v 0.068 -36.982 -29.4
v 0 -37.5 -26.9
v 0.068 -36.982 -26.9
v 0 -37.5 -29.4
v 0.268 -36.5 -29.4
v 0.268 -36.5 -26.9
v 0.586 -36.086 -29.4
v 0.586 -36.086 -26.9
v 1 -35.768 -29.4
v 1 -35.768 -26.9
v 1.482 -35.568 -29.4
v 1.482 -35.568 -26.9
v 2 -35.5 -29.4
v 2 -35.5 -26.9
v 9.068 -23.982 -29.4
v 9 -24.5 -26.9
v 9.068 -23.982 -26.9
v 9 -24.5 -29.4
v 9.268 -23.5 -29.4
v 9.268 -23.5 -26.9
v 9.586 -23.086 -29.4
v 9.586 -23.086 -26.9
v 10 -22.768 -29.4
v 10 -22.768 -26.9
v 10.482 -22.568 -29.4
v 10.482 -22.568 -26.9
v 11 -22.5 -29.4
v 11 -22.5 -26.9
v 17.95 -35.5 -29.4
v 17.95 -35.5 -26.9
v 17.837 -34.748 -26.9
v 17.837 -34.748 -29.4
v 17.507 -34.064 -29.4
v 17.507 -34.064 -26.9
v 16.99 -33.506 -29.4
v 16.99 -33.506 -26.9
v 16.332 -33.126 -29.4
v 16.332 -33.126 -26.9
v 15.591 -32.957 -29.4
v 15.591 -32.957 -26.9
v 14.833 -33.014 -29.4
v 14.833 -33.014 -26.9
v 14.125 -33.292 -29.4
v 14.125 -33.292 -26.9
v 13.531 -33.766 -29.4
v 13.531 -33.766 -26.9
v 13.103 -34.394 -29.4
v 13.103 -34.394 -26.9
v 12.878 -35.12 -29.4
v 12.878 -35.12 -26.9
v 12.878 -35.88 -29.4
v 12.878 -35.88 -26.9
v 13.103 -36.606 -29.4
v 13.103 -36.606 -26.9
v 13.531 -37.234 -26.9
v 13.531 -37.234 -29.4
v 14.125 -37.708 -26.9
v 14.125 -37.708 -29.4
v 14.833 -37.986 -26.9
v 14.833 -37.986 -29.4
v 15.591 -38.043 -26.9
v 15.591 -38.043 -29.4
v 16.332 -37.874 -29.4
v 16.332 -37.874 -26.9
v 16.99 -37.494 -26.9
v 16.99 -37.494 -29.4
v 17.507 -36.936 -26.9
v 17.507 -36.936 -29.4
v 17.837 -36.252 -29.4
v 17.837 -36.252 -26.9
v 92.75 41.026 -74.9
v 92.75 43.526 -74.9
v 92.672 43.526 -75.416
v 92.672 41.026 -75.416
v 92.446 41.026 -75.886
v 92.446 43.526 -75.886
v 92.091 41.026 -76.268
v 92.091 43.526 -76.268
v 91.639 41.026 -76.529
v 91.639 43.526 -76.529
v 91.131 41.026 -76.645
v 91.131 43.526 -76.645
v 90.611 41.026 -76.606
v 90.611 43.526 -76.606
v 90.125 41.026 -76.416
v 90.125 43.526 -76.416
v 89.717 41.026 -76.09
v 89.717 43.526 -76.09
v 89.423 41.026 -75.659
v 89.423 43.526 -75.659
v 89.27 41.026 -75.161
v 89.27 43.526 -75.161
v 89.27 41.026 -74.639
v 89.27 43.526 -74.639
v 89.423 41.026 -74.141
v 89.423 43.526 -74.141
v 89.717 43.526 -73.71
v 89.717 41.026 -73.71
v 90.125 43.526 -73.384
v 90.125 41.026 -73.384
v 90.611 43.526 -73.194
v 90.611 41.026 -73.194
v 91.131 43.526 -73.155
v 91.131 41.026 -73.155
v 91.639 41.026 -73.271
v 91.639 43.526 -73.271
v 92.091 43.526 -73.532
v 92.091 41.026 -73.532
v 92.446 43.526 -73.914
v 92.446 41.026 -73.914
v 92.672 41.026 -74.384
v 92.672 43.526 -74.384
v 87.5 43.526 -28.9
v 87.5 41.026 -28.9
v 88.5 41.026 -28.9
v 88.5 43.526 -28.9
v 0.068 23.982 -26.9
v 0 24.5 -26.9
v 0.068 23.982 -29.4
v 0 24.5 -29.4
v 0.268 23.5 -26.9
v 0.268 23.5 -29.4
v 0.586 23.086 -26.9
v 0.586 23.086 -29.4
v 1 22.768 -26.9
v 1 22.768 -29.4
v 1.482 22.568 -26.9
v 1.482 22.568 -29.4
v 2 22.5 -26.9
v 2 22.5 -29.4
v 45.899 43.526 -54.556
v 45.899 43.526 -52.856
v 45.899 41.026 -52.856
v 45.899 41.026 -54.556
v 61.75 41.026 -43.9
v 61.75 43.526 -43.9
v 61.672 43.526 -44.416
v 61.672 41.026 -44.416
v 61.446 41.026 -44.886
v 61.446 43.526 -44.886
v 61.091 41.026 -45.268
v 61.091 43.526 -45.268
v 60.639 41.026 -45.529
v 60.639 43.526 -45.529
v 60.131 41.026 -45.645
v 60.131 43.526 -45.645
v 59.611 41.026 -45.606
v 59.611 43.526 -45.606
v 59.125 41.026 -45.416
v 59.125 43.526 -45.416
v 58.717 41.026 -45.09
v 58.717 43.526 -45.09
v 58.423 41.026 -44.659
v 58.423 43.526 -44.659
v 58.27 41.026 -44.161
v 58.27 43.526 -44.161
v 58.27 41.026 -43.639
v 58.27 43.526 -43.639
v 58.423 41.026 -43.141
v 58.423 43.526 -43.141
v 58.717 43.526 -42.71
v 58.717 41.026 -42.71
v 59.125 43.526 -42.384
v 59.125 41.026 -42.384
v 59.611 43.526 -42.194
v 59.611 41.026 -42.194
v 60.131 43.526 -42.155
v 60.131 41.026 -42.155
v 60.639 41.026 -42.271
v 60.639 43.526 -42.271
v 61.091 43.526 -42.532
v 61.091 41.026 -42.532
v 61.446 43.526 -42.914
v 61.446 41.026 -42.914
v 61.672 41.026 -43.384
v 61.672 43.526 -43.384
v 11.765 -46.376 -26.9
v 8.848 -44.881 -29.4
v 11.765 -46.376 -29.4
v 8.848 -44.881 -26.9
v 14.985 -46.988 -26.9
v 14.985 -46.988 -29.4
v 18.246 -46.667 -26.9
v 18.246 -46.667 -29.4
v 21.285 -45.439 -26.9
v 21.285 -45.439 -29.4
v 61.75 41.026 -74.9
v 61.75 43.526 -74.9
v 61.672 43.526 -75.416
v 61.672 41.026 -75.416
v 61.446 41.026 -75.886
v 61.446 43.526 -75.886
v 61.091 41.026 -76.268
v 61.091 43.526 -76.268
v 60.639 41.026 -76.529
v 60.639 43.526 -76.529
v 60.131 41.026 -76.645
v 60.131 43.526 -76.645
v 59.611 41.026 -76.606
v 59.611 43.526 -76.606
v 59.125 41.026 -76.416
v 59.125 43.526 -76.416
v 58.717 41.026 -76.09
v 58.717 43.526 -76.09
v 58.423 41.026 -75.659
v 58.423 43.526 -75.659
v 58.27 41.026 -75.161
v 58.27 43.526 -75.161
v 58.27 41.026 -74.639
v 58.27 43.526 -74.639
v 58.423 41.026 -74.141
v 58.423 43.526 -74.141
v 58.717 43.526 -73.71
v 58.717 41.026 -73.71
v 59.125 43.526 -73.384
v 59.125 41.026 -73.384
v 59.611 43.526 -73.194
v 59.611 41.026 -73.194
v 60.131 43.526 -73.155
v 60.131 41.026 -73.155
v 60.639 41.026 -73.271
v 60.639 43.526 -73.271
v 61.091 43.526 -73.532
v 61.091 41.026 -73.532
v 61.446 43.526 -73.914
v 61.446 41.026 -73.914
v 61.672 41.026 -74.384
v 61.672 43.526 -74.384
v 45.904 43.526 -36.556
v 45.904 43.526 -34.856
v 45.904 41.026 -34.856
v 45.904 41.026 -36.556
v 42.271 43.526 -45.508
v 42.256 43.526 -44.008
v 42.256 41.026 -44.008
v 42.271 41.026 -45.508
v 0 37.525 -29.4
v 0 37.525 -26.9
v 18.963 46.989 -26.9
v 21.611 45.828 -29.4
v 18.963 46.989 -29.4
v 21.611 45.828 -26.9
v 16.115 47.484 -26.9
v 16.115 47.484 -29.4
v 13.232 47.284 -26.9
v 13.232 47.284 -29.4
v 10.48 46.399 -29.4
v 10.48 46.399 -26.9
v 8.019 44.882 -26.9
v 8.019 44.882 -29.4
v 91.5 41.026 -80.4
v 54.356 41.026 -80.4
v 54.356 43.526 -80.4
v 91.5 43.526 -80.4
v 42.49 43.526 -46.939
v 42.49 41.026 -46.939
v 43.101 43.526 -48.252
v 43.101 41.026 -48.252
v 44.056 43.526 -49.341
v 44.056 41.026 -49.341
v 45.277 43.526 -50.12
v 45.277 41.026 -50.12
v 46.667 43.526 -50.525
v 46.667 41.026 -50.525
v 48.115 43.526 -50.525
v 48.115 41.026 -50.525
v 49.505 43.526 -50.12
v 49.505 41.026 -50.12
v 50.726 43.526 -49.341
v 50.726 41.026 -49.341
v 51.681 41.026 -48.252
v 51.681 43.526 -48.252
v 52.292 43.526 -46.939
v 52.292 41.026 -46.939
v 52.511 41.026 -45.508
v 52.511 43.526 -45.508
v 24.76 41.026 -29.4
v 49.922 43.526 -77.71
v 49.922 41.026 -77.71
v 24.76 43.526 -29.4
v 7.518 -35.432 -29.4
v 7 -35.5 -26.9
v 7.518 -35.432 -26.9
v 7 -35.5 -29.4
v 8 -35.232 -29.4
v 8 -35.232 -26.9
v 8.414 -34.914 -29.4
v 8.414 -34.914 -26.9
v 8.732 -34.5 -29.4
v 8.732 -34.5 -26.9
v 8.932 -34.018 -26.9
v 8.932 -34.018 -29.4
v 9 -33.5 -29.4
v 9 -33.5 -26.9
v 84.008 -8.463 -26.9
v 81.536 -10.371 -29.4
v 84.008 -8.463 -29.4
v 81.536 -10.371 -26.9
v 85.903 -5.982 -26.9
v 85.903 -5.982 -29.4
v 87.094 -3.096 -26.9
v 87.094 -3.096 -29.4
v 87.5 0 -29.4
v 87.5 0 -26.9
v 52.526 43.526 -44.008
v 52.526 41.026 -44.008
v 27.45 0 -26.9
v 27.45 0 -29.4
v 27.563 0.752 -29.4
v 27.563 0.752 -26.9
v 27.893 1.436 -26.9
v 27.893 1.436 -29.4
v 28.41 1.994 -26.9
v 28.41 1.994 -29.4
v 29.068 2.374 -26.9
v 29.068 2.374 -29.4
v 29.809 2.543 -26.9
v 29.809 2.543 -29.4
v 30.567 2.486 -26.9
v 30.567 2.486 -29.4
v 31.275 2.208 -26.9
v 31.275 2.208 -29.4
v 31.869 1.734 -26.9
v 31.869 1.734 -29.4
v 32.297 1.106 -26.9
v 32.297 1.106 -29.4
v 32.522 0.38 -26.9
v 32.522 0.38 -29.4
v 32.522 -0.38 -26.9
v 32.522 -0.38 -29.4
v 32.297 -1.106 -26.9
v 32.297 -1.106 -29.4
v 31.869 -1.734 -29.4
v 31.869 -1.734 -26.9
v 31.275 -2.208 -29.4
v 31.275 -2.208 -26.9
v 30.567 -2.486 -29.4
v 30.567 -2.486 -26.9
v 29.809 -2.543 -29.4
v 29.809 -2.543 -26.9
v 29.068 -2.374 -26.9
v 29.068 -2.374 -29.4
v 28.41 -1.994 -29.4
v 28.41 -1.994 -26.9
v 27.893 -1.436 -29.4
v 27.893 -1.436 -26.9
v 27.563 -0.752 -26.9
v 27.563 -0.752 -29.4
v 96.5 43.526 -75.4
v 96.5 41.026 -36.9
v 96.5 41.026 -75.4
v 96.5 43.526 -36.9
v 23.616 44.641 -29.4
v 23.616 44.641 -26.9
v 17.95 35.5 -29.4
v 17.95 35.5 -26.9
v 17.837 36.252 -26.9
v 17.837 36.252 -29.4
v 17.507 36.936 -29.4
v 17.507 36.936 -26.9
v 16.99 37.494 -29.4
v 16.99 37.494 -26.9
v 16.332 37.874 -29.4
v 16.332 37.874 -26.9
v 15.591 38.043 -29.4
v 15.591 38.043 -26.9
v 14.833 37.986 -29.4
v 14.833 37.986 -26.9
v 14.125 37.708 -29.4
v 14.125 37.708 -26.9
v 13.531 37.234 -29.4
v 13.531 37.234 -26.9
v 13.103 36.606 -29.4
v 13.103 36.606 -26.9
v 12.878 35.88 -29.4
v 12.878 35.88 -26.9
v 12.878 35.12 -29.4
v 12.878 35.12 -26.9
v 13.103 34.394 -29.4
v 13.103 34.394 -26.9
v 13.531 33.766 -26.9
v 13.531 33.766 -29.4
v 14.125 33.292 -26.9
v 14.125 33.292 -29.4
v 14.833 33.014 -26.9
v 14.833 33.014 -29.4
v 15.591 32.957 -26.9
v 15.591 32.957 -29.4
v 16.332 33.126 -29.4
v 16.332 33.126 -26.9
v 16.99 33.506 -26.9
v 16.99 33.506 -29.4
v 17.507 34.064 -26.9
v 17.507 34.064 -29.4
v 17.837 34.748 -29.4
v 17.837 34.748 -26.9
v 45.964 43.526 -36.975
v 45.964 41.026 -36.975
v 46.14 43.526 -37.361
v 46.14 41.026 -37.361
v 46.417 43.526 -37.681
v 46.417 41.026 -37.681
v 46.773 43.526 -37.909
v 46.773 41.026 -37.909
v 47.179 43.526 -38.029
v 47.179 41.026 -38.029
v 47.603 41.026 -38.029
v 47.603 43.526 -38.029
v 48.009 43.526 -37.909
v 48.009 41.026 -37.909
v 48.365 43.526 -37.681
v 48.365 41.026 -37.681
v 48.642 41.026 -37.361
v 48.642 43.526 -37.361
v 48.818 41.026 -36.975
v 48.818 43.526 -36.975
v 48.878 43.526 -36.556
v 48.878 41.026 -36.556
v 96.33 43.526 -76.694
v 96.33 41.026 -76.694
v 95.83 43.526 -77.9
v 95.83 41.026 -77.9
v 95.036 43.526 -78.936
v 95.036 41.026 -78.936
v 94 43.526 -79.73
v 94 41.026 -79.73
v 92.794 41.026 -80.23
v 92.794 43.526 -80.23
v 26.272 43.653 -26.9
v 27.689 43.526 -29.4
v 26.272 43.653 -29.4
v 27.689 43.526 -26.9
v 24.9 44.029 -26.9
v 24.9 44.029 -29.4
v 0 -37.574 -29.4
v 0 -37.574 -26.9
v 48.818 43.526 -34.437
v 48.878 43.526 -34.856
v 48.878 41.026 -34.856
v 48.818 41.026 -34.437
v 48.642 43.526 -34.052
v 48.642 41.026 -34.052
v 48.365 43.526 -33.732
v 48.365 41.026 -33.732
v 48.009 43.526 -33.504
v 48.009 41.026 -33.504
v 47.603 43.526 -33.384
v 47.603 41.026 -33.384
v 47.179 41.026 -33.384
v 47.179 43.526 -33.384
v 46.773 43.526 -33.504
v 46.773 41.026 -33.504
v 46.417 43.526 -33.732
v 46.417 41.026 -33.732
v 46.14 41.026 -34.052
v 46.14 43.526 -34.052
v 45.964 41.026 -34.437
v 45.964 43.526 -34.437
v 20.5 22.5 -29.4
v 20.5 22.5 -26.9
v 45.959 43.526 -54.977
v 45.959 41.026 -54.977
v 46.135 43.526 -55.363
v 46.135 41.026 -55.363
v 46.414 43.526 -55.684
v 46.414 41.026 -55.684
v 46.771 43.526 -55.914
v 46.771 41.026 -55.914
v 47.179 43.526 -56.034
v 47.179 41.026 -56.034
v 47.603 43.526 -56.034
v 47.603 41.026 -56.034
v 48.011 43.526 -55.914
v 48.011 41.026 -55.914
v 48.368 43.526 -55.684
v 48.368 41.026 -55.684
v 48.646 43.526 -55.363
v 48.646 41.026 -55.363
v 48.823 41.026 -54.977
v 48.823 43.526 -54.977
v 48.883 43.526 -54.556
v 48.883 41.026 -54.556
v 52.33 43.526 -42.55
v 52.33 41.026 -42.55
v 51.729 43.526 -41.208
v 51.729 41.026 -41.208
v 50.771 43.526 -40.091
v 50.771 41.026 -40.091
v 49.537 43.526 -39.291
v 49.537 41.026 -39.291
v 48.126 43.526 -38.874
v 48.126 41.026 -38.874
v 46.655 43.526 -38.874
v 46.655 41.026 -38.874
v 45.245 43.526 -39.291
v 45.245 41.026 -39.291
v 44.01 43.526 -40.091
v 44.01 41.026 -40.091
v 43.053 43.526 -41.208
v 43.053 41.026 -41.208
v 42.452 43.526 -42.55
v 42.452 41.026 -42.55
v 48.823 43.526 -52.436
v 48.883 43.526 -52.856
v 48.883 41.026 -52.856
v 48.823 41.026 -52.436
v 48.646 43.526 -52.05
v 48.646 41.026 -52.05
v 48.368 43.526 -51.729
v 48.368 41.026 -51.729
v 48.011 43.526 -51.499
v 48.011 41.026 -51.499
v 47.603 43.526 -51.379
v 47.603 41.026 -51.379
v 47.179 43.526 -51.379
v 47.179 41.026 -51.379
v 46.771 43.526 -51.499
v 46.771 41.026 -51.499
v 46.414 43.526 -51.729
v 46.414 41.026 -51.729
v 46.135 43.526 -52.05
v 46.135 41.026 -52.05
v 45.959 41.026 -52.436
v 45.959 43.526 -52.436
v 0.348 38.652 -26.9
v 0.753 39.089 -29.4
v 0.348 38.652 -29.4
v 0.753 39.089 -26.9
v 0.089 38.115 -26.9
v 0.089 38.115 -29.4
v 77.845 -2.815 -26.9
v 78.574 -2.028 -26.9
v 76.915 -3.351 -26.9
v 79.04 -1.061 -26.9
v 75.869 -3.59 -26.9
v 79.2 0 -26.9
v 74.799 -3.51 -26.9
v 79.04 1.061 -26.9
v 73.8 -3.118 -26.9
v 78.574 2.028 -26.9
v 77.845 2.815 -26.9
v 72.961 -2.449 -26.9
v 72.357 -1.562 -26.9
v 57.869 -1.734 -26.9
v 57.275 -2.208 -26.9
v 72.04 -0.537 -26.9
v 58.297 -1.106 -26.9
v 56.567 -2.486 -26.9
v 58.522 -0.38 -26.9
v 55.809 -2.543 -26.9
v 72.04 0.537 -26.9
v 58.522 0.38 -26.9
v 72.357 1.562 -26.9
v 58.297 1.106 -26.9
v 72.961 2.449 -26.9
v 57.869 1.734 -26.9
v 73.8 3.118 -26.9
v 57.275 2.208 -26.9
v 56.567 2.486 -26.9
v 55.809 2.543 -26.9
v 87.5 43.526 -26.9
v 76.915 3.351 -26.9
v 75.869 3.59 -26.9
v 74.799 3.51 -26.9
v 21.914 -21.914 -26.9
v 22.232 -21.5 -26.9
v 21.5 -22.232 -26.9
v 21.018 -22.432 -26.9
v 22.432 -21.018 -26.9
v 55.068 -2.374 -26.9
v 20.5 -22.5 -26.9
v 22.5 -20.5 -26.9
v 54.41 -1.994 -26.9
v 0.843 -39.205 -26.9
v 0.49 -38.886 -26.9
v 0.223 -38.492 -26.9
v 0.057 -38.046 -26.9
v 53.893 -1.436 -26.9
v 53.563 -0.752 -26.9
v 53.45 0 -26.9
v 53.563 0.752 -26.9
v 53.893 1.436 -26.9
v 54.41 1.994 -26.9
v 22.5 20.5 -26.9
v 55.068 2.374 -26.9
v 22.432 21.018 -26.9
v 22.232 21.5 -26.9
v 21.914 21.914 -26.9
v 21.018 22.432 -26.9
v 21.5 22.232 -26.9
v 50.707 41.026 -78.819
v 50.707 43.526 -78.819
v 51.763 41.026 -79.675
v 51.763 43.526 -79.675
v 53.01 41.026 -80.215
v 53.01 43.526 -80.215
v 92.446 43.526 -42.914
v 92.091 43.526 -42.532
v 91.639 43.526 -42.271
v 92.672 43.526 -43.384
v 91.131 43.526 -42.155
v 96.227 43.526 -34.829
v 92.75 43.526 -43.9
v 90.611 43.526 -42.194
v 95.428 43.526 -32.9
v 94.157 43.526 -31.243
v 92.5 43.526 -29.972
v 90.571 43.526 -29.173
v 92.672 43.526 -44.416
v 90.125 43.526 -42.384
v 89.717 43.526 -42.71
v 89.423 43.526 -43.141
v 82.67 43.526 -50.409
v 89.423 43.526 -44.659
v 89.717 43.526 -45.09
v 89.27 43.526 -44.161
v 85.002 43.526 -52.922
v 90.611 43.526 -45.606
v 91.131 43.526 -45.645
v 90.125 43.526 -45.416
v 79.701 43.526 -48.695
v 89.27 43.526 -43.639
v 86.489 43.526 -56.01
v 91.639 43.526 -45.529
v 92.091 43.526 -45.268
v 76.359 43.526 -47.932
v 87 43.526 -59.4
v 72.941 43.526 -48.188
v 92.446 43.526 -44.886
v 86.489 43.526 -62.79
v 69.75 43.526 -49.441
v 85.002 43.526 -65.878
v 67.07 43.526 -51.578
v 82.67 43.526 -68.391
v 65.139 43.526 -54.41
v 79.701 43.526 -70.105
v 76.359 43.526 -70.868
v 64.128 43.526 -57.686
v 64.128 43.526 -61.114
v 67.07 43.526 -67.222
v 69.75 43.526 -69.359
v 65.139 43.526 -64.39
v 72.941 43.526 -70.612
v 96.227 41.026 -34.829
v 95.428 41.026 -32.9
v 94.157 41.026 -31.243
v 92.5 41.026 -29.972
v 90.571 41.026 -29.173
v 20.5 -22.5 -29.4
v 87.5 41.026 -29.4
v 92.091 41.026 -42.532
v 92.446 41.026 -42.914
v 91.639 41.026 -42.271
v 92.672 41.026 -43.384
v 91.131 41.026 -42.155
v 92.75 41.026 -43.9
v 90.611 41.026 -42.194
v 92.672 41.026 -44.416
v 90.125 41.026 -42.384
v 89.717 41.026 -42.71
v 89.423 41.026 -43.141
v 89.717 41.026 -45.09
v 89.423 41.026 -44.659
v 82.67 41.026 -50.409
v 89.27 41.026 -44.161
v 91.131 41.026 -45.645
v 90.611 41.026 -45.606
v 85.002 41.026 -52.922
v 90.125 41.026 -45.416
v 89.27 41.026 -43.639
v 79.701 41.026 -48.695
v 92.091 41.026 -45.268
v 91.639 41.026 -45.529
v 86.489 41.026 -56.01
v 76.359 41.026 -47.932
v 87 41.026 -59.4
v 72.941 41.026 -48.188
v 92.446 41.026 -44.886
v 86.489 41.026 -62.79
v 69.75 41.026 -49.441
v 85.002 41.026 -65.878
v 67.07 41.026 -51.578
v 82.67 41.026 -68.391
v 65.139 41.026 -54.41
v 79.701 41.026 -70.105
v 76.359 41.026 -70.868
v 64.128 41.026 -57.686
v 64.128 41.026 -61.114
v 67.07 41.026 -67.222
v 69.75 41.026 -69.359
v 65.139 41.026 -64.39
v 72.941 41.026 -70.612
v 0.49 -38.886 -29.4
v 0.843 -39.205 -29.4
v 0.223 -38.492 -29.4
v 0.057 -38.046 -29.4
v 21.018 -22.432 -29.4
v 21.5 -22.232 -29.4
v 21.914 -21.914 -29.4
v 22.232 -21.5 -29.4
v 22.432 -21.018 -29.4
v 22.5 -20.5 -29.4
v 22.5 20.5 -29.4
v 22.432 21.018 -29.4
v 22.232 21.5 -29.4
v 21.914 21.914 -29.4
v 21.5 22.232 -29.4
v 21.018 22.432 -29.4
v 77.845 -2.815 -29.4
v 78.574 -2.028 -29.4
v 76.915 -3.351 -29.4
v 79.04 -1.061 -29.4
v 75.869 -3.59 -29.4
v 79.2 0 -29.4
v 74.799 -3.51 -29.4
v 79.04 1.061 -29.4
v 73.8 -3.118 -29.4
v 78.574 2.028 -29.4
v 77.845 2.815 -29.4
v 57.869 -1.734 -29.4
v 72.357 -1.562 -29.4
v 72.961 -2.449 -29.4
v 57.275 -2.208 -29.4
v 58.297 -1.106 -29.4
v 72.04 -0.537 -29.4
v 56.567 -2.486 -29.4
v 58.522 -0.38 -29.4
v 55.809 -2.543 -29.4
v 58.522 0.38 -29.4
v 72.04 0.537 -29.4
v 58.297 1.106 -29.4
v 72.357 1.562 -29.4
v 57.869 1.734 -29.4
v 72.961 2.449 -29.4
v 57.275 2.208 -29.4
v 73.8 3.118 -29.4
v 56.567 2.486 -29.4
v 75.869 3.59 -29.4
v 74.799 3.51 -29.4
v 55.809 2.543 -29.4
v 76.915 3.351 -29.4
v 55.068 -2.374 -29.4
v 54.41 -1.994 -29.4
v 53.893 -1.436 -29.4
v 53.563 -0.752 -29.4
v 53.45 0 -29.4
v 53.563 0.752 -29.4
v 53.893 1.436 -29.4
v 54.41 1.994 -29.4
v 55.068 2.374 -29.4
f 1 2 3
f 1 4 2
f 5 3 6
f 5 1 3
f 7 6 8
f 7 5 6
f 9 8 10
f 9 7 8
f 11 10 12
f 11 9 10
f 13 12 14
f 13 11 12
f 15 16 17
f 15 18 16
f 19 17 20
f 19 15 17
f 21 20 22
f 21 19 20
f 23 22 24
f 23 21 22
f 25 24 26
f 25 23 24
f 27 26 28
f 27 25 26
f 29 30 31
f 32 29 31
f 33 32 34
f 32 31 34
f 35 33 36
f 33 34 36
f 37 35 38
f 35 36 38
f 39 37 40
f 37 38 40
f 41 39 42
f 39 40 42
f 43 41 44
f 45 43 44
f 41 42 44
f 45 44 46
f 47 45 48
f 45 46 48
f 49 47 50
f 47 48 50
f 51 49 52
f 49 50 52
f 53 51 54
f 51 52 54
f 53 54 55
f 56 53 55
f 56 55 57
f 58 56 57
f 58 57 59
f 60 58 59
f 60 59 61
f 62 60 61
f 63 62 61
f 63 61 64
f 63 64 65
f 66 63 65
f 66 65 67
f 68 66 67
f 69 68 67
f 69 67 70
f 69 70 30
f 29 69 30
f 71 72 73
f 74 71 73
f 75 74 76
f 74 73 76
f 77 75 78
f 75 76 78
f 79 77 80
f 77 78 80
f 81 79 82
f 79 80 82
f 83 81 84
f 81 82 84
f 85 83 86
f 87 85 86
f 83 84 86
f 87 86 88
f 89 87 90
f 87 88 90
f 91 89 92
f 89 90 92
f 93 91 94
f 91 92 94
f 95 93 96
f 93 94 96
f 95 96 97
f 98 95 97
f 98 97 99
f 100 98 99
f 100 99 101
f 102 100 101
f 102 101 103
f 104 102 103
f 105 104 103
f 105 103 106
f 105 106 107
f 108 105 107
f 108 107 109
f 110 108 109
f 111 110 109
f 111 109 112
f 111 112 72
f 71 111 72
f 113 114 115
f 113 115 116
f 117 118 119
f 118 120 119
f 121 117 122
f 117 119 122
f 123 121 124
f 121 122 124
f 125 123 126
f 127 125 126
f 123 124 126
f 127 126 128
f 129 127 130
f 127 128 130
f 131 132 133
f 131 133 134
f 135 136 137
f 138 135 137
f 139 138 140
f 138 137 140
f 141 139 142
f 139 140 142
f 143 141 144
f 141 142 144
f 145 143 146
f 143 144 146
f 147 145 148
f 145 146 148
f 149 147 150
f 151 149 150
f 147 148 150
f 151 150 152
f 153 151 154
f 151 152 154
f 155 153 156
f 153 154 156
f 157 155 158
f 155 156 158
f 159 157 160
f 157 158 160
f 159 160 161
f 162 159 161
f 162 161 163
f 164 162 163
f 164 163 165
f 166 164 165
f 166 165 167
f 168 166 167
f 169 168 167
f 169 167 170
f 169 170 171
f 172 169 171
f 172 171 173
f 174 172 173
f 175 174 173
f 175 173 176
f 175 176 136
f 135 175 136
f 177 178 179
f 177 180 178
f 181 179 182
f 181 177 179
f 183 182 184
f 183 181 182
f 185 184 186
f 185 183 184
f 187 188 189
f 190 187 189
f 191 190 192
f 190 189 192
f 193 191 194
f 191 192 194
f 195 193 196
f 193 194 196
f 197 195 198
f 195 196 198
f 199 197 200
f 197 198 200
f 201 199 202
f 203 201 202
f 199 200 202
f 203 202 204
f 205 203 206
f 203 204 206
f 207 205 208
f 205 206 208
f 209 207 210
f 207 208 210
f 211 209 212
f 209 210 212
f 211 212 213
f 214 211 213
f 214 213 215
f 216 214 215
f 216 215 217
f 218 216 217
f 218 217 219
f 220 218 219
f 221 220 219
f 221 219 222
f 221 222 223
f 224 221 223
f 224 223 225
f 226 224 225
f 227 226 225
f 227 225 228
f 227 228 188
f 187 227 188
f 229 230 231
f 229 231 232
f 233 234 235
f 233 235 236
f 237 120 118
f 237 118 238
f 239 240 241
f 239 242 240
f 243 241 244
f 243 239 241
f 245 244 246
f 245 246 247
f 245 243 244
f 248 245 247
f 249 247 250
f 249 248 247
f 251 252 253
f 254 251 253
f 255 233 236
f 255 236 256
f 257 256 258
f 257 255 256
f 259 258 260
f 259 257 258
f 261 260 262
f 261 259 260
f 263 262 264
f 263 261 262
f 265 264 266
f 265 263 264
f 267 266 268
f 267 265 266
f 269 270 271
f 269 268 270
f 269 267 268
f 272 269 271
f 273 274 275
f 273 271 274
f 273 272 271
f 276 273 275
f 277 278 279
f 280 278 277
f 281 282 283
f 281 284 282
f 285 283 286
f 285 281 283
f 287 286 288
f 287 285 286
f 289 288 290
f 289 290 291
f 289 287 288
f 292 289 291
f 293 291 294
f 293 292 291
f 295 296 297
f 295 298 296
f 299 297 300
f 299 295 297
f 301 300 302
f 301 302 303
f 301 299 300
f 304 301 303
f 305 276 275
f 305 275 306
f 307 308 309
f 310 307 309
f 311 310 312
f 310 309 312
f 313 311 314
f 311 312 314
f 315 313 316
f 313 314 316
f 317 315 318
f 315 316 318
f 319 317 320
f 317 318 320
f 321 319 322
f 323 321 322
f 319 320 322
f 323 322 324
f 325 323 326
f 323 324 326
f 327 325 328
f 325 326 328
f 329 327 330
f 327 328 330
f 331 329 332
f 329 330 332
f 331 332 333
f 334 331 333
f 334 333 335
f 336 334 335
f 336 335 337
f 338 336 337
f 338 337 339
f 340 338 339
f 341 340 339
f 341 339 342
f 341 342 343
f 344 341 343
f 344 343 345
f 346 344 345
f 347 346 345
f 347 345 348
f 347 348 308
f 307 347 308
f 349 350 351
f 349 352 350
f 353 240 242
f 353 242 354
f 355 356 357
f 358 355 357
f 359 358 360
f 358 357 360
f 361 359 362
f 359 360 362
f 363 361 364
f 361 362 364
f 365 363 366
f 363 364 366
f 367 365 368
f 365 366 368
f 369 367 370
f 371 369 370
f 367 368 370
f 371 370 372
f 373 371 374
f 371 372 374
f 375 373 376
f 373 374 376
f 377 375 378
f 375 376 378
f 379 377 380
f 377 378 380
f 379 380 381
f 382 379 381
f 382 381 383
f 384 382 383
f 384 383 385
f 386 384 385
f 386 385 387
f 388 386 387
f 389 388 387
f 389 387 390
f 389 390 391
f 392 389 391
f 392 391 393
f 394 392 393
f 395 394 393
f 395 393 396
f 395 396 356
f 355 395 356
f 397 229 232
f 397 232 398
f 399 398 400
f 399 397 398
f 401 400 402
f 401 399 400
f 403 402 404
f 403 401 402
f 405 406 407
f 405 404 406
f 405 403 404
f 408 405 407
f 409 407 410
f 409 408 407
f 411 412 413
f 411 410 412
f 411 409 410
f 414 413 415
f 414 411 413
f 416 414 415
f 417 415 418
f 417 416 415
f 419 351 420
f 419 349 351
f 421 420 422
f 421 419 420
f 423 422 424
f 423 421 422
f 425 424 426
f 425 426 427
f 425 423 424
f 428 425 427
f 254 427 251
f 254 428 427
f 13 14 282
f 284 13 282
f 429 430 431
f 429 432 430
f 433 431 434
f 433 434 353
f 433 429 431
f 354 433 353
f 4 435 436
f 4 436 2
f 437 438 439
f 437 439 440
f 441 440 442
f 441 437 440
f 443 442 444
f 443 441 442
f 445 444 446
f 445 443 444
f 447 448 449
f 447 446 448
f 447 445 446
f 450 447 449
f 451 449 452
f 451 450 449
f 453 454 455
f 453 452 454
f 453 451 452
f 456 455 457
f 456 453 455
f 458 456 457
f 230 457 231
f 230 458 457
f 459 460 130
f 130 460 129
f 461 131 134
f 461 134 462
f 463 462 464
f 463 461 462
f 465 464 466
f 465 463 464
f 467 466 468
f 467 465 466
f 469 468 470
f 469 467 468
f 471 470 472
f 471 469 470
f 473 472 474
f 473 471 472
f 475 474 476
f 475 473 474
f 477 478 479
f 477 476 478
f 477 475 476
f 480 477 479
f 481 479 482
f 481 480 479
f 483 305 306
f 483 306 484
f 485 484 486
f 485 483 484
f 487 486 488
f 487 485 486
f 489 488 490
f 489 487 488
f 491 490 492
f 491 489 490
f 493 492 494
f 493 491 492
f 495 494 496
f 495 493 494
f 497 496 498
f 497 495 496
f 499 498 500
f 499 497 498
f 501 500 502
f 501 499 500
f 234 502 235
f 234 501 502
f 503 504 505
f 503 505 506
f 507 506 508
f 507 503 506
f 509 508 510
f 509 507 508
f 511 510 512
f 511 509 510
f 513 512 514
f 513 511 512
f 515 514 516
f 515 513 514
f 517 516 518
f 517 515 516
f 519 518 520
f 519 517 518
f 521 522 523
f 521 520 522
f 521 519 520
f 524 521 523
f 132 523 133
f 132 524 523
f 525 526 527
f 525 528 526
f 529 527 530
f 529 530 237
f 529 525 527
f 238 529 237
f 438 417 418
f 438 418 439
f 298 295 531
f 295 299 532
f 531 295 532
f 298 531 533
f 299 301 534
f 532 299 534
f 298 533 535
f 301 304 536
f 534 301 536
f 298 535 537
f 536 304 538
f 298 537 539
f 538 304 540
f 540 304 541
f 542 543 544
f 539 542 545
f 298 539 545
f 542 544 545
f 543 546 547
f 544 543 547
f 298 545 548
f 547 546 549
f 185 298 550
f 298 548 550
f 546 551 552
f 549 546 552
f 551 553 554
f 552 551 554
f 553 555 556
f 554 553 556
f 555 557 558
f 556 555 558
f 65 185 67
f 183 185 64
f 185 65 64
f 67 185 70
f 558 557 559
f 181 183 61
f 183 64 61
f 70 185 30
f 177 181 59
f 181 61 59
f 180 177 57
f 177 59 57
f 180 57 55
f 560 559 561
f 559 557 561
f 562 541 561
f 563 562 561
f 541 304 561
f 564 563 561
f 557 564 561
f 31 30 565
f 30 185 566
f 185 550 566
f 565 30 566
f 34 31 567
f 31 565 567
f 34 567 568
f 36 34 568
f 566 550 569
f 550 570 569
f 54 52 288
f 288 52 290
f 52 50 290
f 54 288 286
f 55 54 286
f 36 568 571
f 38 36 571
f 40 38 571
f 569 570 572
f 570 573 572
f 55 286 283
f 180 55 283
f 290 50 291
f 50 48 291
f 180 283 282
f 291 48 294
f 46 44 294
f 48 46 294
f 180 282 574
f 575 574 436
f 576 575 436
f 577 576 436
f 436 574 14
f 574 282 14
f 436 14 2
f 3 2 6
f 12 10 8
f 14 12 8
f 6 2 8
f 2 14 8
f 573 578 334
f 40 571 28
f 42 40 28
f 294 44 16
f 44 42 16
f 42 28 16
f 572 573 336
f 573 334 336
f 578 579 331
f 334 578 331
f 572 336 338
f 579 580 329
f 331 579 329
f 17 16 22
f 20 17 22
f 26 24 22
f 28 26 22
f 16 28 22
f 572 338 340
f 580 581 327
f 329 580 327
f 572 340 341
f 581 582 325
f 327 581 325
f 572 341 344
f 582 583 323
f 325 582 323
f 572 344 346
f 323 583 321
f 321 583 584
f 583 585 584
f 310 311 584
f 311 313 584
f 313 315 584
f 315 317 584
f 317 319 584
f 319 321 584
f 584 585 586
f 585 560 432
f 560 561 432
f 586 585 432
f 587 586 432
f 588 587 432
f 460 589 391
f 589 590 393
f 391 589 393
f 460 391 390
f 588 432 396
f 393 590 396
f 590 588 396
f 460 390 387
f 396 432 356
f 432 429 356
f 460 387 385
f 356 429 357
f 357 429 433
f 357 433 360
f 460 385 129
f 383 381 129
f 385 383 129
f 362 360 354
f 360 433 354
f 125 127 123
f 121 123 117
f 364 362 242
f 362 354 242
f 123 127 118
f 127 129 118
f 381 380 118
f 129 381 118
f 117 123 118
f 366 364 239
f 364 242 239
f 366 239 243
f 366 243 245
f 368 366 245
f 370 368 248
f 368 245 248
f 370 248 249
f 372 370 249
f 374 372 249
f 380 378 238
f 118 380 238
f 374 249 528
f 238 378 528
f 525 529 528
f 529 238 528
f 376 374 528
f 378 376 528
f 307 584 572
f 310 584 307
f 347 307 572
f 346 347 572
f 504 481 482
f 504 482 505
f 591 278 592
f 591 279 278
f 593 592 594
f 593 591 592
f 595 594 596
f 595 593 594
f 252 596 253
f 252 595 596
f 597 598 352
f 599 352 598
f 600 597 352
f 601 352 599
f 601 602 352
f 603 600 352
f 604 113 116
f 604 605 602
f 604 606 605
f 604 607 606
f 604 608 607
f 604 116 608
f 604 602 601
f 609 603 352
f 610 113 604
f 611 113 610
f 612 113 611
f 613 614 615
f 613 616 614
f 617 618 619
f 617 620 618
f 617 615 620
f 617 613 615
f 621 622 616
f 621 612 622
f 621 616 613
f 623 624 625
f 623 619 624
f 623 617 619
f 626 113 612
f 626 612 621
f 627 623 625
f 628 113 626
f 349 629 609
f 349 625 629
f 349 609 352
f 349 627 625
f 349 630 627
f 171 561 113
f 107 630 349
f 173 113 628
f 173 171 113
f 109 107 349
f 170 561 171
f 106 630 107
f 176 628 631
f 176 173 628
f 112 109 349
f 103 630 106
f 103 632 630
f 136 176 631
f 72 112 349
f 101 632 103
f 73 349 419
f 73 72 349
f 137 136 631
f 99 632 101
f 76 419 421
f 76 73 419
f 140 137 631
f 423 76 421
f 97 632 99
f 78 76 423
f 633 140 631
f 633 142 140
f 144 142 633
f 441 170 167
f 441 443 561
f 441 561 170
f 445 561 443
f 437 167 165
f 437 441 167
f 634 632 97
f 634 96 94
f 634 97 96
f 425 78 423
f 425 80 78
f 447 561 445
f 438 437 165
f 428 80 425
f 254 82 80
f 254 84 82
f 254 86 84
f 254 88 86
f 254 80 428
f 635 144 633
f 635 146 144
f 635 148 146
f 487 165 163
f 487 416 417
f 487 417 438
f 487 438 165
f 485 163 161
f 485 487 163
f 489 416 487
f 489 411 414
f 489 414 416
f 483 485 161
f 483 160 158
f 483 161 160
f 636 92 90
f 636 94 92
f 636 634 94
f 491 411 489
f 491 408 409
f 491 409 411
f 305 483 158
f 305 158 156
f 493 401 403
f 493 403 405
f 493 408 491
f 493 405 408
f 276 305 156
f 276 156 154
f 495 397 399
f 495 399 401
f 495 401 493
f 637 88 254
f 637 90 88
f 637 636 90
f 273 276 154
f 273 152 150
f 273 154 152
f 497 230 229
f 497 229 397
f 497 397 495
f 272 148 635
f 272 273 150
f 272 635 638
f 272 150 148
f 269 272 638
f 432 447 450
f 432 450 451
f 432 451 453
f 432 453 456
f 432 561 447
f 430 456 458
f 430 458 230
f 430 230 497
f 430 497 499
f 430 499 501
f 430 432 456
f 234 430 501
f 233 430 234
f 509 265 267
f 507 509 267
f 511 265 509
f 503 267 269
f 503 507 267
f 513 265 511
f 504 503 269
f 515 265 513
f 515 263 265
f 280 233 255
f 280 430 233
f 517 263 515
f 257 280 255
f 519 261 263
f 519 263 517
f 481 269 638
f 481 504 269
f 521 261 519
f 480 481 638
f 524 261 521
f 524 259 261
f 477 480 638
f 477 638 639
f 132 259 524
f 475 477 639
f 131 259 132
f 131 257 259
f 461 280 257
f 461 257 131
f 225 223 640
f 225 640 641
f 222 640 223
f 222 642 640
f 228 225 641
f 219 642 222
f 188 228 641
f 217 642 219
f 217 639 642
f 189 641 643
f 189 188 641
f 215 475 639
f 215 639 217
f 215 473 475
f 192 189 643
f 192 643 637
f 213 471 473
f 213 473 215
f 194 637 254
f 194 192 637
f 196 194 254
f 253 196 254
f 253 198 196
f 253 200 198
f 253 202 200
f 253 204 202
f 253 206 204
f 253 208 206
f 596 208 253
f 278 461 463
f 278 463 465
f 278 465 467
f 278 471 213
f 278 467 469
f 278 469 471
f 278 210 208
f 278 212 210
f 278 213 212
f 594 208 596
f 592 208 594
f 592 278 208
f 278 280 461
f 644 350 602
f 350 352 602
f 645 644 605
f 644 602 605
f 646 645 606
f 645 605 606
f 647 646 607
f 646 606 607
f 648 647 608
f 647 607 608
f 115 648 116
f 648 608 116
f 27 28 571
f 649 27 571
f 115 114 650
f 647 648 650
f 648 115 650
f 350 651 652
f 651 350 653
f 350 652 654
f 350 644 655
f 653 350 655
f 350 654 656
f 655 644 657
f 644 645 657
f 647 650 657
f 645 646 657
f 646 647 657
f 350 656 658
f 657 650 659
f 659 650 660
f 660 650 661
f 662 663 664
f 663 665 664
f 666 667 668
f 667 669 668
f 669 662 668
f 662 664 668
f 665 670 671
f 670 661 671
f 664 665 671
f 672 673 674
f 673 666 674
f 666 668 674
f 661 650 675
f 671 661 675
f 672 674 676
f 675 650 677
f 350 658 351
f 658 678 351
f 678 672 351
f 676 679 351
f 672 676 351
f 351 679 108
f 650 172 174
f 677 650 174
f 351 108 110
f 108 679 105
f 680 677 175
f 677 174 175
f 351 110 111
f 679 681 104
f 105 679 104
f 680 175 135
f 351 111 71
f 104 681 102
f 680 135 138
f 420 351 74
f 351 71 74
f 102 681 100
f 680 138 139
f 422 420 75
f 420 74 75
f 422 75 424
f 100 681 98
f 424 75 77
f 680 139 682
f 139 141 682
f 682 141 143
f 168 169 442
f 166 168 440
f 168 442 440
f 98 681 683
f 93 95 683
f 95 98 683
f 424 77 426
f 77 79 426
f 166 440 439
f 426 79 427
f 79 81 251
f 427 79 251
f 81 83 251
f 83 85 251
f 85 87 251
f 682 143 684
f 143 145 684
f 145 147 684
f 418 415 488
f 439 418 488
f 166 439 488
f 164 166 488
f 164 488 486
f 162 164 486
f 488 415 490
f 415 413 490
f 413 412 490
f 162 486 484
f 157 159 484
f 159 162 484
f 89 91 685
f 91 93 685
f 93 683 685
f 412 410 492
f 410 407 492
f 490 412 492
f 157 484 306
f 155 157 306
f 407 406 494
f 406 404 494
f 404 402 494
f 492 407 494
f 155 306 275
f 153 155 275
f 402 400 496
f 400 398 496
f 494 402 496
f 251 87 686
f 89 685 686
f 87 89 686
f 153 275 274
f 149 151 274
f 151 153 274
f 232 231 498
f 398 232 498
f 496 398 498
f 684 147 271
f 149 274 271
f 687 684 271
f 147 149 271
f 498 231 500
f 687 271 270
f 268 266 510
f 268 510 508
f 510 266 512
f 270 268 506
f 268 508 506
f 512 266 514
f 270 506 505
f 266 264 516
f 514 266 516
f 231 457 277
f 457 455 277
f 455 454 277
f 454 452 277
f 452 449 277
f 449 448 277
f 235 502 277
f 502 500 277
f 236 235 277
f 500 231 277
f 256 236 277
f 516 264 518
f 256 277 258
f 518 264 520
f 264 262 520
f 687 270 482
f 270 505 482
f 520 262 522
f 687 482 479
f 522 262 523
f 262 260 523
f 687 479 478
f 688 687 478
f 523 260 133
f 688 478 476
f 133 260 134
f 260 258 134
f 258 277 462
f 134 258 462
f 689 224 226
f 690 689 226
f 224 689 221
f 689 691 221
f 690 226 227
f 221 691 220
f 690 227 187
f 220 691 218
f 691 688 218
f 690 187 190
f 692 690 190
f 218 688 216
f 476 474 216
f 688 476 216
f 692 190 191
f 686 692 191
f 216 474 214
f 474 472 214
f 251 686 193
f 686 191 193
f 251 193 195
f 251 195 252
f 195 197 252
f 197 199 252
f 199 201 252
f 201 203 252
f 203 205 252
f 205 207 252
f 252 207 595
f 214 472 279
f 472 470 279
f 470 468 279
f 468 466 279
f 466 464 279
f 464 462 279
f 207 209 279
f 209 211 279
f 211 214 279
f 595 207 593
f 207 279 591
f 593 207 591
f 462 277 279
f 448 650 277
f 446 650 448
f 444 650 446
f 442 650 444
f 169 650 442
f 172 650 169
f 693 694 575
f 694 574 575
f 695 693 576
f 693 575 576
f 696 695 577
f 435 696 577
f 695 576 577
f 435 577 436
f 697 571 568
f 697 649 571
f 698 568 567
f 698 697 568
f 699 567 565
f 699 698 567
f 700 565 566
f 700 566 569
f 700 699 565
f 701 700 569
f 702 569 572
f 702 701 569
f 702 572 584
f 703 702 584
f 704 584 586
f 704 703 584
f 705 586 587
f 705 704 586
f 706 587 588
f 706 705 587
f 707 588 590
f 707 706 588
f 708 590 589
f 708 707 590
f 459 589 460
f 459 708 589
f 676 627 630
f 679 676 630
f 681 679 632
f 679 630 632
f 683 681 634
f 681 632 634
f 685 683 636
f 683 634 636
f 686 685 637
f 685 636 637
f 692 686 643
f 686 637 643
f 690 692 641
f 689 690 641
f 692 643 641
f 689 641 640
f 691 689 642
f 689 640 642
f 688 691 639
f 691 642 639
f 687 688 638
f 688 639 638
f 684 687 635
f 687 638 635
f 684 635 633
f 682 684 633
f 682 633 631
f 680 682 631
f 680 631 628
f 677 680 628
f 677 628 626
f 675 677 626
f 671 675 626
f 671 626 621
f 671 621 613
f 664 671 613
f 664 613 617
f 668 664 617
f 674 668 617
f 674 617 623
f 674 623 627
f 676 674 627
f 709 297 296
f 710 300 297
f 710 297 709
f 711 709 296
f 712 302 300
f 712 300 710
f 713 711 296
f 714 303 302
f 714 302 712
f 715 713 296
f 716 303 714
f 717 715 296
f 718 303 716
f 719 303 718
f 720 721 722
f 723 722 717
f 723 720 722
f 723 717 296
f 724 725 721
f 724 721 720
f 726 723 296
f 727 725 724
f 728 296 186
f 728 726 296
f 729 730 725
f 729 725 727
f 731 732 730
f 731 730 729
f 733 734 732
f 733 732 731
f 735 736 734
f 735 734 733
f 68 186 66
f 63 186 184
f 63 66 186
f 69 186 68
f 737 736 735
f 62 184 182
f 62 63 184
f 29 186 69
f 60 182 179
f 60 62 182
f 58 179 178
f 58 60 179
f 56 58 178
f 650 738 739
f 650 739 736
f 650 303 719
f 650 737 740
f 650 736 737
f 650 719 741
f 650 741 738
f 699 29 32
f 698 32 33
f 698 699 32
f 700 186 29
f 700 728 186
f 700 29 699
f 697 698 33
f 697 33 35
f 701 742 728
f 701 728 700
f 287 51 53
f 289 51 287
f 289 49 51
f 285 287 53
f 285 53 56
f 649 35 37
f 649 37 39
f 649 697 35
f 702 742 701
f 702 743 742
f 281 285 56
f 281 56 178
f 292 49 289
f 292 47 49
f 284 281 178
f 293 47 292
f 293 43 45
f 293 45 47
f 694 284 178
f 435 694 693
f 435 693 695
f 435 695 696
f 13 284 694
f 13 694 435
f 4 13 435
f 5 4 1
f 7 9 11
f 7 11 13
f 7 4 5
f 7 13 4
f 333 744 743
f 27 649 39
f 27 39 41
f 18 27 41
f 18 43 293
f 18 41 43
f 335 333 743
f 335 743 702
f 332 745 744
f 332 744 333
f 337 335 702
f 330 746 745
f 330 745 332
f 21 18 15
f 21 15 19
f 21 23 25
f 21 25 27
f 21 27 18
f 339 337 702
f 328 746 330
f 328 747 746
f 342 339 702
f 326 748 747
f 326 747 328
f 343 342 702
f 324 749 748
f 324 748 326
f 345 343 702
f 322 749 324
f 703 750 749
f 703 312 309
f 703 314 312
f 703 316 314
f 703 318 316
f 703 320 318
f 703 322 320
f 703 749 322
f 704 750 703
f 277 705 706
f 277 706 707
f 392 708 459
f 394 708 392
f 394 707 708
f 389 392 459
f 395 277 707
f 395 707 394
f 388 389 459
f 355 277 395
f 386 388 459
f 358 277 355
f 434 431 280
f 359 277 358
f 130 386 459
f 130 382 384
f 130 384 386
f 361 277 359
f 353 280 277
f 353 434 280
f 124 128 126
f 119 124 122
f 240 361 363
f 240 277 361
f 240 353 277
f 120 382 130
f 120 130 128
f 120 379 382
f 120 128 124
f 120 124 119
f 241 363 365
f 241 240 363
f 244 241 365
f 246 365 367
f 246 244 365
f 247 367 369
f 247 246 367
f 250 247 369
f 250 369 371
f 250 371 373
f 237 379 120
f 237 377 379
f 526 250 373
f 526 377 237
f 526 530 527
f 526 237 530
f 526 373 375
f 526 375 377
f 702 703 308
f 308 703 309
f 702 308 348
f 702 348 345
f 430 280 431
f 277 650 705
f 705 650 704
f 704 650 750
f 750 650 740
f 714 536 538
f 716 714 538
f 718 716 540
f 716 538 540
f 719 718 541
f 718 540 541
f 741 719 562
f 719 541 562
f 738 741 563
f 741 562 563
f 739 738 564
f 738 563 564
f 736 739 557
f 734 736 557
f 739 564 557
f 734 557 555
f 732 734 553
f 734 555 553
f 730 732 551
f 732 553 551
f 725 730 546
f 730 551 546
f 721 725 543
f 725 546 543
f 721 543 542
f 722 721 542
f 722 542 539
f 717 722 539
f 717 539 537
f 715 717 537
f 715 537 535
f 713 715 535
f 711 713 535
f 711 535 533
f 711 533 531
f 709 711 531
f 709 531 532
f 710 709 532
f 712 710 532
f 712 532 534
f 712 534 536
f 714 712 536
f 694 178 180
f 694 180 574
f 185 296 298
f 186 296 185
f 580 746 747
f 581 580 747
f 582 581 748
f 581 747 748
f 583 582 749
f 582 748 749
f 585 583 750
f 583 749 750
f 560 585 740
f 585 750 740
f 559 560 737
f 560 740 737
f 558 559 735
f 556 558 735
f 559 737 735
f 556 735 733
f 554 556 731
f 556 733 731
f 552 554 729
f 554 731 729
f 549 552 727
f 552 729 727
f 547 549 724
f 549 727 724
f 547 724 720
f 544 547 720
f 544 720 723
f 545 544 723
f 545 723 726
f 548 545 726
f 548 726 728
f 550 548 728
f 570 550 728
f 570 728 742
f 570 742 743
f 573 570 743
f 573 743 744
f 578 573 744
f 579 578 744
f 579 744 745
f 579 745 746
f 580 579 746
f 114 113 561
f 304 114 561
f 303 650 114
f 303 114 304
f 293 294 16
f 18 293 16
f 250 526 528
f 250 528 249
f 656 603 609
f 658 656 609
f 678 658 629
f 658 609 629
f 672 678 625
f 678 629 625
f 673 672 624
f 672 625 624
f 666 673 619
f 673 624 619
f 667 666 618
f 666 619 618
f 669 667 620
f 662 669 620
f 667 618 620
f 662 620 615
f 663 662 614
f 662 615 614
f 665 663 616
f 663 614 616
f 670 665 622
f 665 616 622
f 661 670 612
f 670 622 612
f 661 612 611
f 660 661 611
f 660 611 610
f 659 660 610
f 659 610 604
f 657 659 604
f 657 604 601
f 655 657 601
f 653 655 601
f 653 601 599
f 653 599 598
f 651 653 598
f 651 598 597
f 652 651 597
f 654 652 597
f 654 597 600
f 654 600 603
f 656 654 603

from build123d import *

# Parameters (mm, degrees)
SALIENTE_EXTRUIR1_DEPTH             = 2.5
CROQUIS2_W                          = 51
CROQUIS2_H                          = 2.5
SALIENTE_EXTRUIR2_DEPTH             = 36.177083333
SALIENTE_EXTRUIR3_DEPTH             = 2.5
CROQUIS4_W                          = 51.5
CROQUIS4_H                          = 2.5
SALIENTE_EXTRUIR4_DEPTH             = 9
CORTAR_EXTRUIR1_DEPTH               = 122.155458756
DI_METRO_DE_TALADRO_5_1_5_1_1_D     = 5.1
DI_METRO_DE_TALADRO_5_1_5_1_1_DEPTH = 53.5
DI_METRO_DE_TALADRO_5_1_5_1_2_D     = 5.1
DI_METRO_DE_TALADRO_7_2_7_2_1_D     = 7.2
DI_METRO_DE_TALADRO_23_0_23_1_D     = 23
DI_METRO_DE_TALADRO_23_0_23_1_DEPTH = 9.015002711
DI_METRO_DE_TALADRO_3_5_3_5_1_D     = 3.5
DI_METRO_DE_TALADRO_3_5_3_5_1_DEPTH = 9.015002711
REDONDEO1_R                         = 2
REDONDEO2_R                         = 5
REDONDEO3_R                         = 8
REDONDEO4_R                         = 11.5
REDONDEO5_R                         = 12
CORTAR_EXTRUIR2_DEPTH               = 10


with BuildPart() as part:
    # Croquis1 → Saliente-Extruir1 (new body)
    with BuildSketch(Plane(origin=(0, 43.526431985, 0), x_dir=(1, 0, 0), z_dir=(0, 1, 0))):
        Polygon((24.760416667, 29.4), (51.322916667, 29.4), (51.322916667, 80.4), align=None)
    extrude(amount=-SALIENTE_EXTRUIR1_DEPTH)

    # Croquis2 → Saliente-Extruir2 (add)
    with BuildSketch(Plane(origin=(51.322916667, 0, 0), x_dir=(0, 0, -1), z_dir=(1, 0, 0))):
        with Locations((54.9, 42.276431985)):
            Rectangle(CROQUIS2_W, CROQUIS2_H)
    extrude(amount=SALIENTE_EXTRUIR2_DEPTH)

    # Croquis3 → Saliente-Extruir3 (add)
    with BuildSketch(Plane.XY.offset(-29.4)):
        Polygon((0, -38.607215424), (0, 38.4885797), (14.488727812, 50.041434696), (25.5, 43.526431985), (87.5, 43.526431985), (87.5, -6.900242064), (14.886977722, -49.162809247), align=None)
    extrude(amount=SALIENTE_EXTRUIR3_DEPTH)

    # Croquis4 → Saliente-Extruir4 (add)
    with BuildSketch(Plane(origin=(87.5, 0, 0), x_dir=(0, 0, -1), z_dir=(1, 0, 0))):
        with Locations((54.65, 42.276431985)):
            Rectangle(CROQUIS4_W, CROQUIS4_H)
    extrude(amount=SALIENTE_EXTRUIR4_DEPTH)

    # Croquis5 → Cortar-Extruir1 (cut, through all)
    with BuildSketch(Plane.XY.offset(-26.9)):
        Polygon((0, 22.5), (0, -35.5), (9, -35.5), (9, -22.5), (22.5, -22.5), (22.5, 22.5), align=None)
    extrude(amount=-CORTAR_EXTRUIR1_DEPTH, mode=Mode.SUBTRACT)

    # Diámetro de taladro Ø5.1 (5.1)1
    with Locations(Plane.XY.offset(-26.9)):
        with Locations((56, 0), (30, 0)):
            Hole(DI_METRO_DE_TALADRO_5_1_5_1_1_D / 2, depth=DI_METRO_DE_TALADRO_5_1_5_1_1_DEPTH)

    # Diámetro de taladro Ø5.1 (5.1)2 (through all)
    with Locations(Plane(origin=(0, 0, -29.4), x_dir=(-1, 0, 0), z_dir=(0, 0, -1))):
        with Locations((-15.4, -35.5), (-15.4, 35.5)):
            Hole(DI_METRO_DE_TALADRO_5_1_5_1_2_D / 2)

    # Diámetro de taladro Ø7.2 (7.2)1 (through all)
    with Locations(Plane(origin=(0, 0, -29.4), x_dir=(-1, 0, 0), z_dir=(0, 0, -1))):
        with Locations((-75.6, 0)):
            Hole(DI_METRO_DE_TALADRO_7_2_7_2_1_D / 2)

    # Diámetro de taladro Ø23.0 (23)1
    with Locations(Plane(origin=(0, 41.026431985, 0), x_dir=(-1, 0, 0), z_dir=(0, -1, 0))):
        with Locations((-75.5, 59.4)):
            Hole(DI_METRO_DE_TALADRO_23_0_23_1_D / 2, depth=DI_METRO_DE_TALADRO_23_0_23_1_DEPTH)

    # Diámetro de taladro Ø3.5 (3.5)1
    with Locations(Plane(origin=(0, 41.026431985, 0), x_dir=(-1, 0, 0), z_dir=(0, -1, 0))):
        with Locations((-60, 74.9), (-91, 43.9), (-60, 43.9), (-91, 74.9)):
            Hole(DI_METRO_DE_TALADRO_3_5_3_5_1_D / 2, depth=DI_METRO_DE_TALADRO_3_5_3_5_1_DEPTH)

    # Redondeo1
    redondeo1_edges = [part.edges().sort_by_distance(p)[0] for p in [
        (0, -38.607215424, -28.15),
        (0, 38.4885797, -28.15),
        (0, 22.5, -28.15),
        (22.5, 22.5, -28.15),
        (22.5, -22.5, -28.15),
        (9, -22.5, -28.15),
        (9, -35.5, -28.15),
        (0, -35.5, -28.15),
    ]]
    fillet(redondeo1_edges, radius=REDONDEO1_R)

    # Redondeo2
    redondeo2_edges = [part.edges().sort_by_distance(p)[0] for p in [
        (96.5, 42.276431985, -80.4),
        (51.322916667, 42.276431985, -80.4),
    ]]
    fillet(redondeo2_edges, radius=REDONDEO2_R)

    # Redondeo3
    redondeo3_edges = [part.edges().sort_by_distance(p)[0] for p in [
        (25.5, 43.526431985, -28.15),
        (96.5, 42.276431985, -28.9),
    ]]
    fillet(redondeo3_edges, radius=REDONDEO3_R)

    # Redondeo4
    redondeo4_edges = [part.edges().sort_by_distance(p)[0] for p in [
        (14.886977722, -49.162809247, -28.15),
    ]]
    fillet(redondeo4_edges, radius=REDONDEO4_R)

    # Redondeo5
    redondeo5_edges = [part.edges().sort_by_distance(p)[0] for p in [
        (87.5, -6.900242064, -28.15),
        (14.488727812, 50.041434696, -28.15),
    ]]
    fillet(redondeo5_edges, radius=REDONDEO5_R)

    # Croquis19 → Cortar-Extruir2 (cut)
    with BuildSketch(Plane(origin=(0, 43.526431985, 0), x_dir=(1, 0, 0), z_dir=(0, 1, 0))):
        with BuildLine():
            Line((42.255993265, 44.007837327), (42.270997317, 45.507687231))
            ThreePointArc((42.270997317, 45.507687231), (47.390937401, 50.576665136), (52.510877484, 45.507687231))
            Line((52.510877484, 45.507687231), (52.525881536, 44.007837327))
            ThreePointArc((52.525881536, 44.007837327), (47.390937401, 38.821267806), (42.255993265, 44.007837327))
        make_face()
        with BuildLine():
            Line((45.903627778, 34.856468872), (45.903627778, 36.556468872))
            ThreePointArc((45.903627778, 36.556468872), (47.390937401, 38.043778494), (48.878247023, 36.556468872))
            Line((48.878247023, 36.556468872), (48.878247023, 34.856468872))
            ThreePointArc((48.878247023, 34.856468872), (47.390937401, 33.36915925), (45.903627778, 34.856468872))
        make_face()
        with BuildLine():
            Line((45.898554991, 52.856468872), (45.898554991, 54.556468872))
            ThreePointArc((45.898554991, 54.556468872), (47.390937401, 56.048851282), (48.883319811, 54.556468872))
            Line((48.883319811, 54.556468872), (48.883319811, 52.856468872))
            ThreePointArc((48.883319811, 52.856468872), (47.390937401, 51.364086462), (45.898554991, 52.856468872))
        make_face()
    extrude(amount=-CORTAR_EXTRUIR2_DEPTH, mode=Mode.SUBTRACT)


solid = part.part
